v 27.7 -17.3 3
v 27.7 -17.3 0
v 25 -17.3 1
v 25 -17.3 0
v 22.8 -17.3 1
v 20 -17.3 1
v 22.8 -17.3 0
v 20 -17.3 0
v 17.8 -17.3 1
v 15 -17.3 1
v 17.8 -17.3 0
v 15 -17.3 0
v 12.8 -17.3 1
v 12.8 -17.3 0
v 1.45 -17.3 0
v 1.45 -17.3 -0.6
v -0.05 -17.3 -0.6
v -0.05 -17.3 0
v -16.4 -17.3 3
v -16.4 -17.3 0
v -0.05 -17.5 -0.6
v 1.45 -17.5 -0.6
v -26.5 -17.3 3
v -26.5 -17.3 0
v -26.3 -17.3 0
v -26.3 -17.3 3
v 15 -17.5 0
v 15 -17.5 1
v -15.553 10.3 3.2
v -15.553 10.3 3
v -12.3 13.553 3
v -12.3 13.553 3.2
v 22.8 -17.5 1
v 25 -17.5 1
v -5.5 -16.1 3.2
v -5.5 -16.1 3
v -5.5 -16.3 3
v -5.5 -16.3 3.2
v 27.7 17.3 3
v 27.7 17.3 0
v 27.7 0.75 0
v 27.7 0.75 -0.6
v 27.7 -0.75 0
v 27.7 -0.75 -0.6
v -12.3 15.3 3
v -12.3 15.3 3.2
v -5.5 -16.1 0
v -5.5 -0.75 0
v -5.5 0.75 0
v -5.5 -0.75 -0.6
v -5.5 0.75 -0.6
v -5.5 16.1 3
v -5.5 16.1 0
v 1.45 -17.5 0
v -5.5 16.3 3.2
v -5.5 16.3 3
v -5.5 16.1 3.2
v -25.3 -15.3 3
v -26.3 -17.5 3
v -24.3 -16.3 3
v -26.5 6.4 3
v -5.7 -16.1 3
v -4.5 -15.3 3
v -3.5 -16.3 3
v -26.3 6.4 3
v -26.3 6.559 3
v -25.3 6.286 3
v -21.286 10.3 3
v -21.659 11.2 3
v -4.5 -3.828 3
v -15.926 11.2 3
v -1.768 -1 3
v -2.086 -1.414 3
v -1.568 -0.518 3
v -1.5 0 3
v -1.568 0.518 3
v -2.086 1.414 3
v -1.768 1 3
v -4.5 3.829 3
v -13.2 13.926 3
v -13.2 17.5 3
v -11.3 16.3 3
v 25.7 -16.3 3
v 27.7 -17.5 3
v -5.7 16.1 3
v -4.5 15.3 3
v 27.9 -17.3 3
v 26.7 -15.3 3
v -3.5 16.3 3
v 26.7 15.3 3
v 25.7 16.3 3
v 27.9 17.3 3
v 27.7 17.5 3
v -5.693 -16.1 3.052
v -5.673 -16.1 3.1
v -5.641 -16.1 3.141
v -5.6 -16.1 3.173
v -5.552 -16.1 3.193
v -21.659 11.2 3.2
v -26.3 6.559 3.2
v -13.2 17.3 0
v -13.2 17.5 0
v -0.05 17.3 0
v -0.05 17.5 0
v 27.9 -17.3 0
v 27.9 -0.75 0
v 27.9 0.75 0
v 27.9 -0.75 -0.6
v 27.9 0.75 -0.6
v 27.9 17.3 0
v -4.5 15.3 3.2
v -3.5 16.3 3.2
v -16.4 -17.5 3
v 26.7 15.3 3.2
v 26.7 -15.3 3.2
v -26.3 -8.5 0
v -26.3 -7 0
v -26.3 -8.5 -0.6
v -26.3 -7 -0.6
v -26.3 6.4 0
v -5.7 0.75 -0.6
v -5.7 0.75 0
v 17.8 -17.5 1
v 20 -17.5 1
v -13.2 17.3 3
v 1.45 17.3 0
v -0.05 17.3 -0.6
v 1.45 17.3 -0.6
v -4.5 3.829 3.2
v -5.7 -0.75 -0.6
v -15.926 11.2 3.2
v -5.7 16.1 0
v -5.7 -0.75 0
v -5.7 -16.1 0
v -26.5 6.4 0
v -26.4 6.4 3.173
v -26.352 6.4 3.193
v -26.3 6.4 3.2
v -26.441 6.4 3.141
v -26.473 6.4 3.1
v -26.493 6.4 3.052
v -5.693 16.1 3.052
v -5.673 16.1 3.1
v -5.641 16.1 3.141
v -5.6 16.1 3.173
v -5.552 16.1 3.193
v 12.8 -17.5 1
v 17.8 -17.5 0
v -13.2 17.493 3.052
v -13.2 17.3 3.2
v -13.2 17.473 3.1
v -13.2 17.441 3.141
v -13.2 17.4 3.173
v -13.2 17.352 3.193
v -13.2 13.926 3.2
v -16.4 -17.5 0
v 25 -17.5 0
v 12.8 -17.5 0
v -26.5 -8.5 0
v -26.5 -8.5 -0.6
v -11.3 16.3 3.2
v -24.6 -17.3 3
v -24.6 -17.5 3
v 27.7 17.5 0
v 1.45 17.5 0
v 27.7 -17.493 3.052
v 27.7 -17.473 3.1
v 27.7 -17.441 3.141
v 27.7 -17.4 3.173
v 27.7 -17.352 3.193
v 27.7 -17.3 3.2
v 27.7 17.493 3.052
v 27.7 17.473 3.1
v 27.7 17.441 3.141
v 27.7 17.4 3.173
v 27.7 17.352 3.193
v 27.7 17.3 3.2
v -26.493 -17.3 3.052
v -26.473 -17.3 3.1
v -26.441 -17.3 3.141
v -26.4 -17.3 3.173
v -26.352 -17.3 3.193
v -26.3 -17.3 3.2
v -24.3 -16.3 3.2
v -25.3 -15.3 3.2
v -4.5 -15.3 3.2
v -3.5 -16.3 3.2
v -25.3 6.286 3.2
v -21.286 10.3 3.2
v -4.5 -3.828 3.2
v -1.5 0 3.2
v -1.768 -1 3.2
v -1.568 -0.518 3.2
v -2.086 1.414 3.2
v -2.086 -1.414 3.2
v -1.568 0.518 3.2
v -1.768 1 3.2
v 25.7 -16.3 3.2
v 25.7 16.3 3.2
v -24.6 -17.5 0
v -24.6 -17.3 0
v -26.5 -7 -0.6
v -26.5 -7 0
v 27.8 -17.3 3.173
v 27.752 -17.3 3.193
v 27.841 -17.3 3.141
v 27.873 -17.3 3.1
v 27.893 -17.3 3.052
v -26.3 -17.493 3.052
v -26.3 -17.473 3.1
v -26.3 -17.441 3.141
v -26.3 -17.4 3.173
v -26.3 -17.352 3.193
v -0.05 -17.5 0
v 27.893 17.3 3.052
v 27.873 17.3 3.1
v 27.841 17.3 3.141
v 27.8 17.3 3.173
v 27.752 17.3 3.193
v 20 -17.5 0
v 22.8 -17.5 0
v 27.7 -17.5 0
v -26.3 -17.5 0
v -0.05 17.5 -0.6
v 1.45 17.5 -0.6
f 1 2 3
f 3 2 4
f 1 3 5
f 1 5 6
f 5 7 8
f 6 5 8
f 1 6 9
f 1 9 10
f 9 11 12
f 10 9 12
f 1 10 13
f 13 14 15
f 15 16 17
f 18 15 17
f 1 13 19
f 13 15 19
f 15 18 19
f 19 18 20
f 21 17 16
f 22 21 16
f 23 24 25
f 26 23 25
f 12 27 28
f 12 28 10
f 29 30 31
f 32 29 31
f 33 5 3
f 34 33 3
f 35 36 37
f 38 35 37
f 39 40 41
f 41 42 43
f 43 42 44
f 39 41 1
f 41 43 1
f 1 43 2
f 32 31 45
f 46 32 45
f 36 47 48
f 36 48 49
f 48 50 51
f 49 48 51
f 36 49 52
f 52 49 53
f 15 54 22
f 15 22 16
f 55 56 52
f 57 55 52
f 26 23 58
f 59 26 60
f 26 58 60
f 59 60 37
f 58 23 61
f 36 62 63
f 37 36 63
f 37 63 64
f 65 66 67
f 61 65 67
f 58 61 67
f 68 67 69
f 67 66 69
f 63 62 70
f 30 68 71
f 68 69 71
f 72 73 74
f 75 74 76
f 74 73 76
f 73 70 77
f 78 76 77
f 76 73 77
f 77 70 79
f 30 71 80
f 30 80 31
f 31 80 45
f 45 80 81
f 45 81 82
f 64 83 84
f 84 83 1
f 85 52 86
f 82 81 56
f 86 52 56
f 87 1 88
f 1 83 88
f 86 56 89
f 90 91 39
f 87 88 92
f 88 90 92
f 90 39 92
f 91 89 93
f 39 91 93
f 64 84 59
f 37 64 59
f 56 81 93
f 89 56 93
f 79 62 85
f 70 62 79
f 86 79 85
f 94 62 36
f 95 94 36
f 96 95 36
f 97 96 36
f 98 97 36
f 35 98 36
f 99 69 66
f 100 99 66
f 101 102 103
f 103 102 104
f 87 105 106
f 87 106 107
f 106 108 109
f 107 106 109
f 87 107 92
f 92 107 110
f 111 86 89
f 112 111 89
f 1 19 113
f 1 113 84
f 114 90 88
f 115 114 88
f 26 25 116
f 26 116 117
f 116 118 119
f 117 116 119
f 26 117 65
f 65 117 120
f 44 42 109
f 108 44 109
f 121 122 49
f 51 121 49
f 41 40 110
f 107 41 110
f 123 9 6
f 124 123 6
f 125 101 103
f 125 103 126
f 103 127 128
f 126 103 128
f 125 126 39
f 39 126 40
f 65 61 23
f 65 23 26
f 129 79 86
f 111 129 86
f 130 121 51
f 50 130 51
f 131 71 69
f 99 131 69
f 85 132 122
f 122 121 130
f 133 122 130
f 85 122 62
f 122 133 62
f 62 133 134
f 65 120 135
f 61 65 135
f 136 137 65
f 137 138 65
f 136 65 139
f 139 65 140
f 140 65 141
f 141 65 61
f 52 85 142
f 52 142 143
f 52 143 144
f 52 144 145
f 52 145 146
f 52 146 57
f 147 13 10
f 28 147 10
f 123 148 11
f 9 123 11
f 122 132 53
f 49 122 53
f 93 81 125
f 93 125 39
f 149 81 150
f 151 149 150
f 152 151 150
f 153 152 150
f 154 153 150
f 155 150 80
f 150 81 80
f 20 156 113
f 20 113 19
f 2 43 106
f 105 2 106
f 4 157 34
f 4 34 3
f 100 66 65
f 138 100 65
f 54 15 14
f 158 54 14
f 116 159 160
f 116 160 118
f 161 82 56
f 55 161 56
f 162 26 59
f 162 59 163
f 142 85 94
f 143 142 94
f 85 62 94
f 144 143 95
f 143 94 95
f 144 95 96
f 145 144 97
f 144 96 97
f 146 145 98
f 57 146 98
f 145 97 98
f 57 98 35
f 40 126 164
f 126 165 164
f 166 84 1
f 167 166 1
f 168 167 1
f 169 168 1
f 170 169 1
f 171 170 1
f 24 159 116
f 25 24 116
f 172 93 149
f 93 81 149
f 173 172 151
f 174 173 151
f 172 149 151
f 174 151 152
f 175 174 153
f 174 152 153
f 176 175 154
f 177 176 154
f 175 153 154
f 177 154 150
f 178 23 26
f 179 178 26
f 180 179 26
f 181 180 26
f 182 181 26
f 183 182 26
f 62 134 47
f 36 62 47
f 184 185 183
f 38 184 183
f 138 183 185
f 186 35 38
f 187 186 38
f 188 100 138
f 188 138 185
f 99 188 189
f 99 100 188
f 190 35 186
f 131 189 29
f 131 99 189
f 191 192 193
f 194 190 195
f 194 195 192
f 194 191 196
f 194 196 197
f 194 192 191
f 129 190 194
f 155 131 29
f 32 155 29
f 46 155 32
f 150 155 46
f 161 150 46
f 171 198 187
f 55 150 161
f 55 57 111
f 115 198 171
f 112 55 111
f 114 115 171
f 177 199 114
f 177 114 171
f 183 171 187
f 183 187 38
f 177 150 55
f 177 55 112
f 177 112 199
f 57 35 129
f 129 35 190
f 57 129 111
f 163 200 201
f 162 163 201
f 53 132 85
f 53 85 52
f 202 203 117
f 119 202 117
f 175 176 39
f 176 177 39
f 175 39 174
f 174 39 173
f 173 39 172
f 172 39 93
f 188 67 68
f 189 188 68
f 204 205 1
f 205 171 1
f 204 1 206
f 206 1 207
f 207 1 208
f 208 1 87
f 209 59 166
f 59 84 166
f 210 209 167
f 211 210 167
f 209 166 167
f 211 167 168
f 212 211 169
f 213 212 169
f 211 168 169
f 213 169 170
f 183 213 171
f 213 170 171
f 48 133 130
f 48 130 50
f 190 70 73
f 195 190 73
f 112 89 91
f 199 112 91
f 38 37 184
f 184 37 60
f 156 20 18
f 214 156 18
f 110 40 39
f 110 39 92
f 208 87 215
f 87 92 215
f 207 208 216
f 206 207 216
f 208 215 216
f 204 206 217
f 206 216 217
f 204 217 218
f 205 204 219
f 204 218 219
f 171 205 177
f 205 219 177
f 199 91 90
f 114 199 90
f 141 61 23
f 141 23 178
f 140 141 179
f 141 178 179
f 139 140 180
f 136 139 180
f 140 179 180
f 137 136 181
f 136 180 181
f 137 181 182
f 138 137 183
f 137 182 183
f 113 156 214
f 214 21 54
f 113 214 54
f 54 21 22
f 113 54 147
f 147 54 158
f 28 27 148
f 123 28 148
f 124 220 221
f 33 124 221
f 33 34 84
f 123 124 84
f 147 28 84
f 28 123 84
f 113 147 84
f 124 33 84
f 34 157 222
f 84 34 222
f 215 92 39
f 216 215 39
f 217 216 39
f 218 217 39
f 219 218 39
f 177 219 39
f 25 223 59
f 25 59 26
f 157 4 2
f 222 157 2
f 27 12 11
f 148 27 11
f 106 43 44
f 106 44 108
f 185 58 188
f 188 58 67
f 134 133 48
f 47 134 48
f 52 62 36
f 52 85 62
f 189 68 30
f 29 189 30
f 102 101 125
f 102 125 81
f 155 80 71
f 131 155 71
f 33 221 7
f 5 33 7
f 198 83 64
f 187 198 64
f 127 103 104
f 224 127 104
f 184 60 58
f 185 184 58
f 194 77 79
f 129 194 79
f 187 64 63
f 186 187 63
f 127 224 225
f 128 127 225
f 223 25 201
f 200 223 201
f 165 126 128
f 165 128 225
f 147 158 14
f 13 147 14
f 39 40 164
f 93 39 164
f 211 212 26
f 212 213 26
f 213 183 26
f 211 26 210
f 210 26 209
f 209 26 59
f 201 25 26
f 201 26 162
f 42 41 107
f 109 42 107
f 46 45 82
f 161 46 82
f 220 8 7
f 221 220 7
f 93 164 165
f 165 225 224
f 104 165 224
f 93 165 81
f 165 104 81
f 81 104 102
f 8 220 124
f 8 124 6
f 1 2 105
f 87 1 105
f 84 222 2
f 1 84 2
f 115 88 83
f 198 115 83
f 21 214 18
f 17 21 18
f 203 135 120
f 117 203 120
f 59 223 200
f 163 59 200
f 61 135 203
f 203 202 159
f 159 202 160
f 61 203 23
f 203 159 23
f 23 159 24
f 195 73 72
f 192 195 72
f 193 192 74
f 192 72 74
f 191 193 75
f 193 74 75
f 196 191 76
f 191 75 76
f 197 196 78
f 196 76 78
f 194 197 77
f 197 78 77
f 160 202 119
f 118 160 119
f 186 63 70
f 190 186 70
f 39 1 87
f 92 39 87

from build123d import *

# Parameters (mm, degrees)
F0_W     = 0.2
F0_H     = 1.5
F0_H_2   = 8.8
F1_DEPTH = 3
F0_W_2   = 1.7
F0_H_3   = 0.2
F0_W_3   = 16.35
F0_W_4   = 1.5
F0_W_5   = 11.35
F0_W_6   = 2.199999
F0_W_7   = 2.800001
F0_W_8   = 2.700001
F0_H_4   = 15.349983
F0_H_5   = 15.349984
F0_H_6   = 16.549983
F0_H_7   = 16.549984
F0_W_9   = 26.25
F0_W_10  = 13.149958
F2_START = 3
F2_DEPTH = 0.2
F3_DEPTH = 1
F4_DEPTH = 0.6
F5_R     = 0.1999


# Not quite as in the source:
# - a fillet or chamfer is up to 0.001 mm smaller than in the source, because OpenCascade refuses the exact size
# - ends of sketch curves that miss each other by under 0.0002 mm in the source are joined


with BuildPart() as f1:
    # F0 (on Top) → F1 (new body)
    with BuildSketch(Plane.XY):
        with Locations((-26.40002, -7.749967)):
            Rectangle(F0_W, F0_H)
        Polygon((-26.30002, 6.400033), (-26.50002, 6.400037), (-26.50002, -6.999967), (-26.30002, -6.999967), align=None)
        with Locations((-26.40002, -12.899967)):
            Rectangle(F0_W, F0_H_2)
    extrude(amount=F1_DEPTH)

    # F0 (on Top) → F4, piece 3 (join)
    with BuildSketch(Plane.XY):
        with Locations((-26.40002, -7.749967)):
            Rectangle(F0_W, F0_H)
    extrude(amount=-F4_DEPTH)


with BuildPart() as f1b:
    # F0 (on Top) → F1, piece 2 (new body)
    with BuildSketch(Plane.XY):
        with Locations((-25.45002, -17.399967)):
            Rectangle(F0_W_2, F0_H_3)
    extrude(amount=F1_DEPTH)


with BuildPart() as f1c:
    # F0 (on Top) → F1, piece 3 (new body)
    with BuildSketch(Plane.XY):
        with Locations((-8.22502, -17.399967)):
            Rectangle(F0_W_3, F0_H_3)
        with Locations((0.69998, -17.399967)):
            Rectangle(F0_W_4, F0_H_3)
        with Locations((7.12498, -17.399967)):
            Rectangle(F0_W_5, F0_H_3)
        with Locations((13.8999795, -17.399967)):
            Rectangle(F0_W_6, F0_H_3)
        with Locations((16.3999795, -17.399967)):
            Rectangle(F0_W_7, F0_H_3)
        with Locations((18.8999795, -17.399967)):
            Rectangle(F0_W_6, F0_H_3)
        with Locations((21.3999795, -17.399967)):
            Rectangle(F0_W_7, F0_H_3)
        with Locations((23.8999795, -17.399967)):
            Rectangle(F0_W_6, F0_H_3)
        with Locations((26.3499795, -17.399967)):
            Rectangle(F0_W_8, F0_H_3)
    extrude(amount=F1_DEPTH)

    # F0 (on Top) → F3 (cut)
    with BuildSketch(Plane.XY):
        with Locations((13.8999795, -17.399967)):
            Rectangle(F0_W_6, F0_H_3)
        with Locations((18.8999795, -17.399967)):
            Rectangle(F0_W_6, F0_H_3)
        with Locations((23.8999795, -17.399967)):
            Rectangle(F0_W_6, F0_H_3)
    extrude(amount=F3_DEPTH, mode=Mode.SUBTRACT)

    # F0 (on Top) → F4 (join)
    with BuildSketch(Plane.XY):
        with Locations((0.69998, -17.399967)):
            Rectangle(F0_W_4, F0_H_3)
    extrude(amount=-F4_DEPTH)


with BuildPart() as f1d:
    # F0 (on Top) → F1, piece 4 (new body)
    with BuildSketch(Plane.XY):
        with Locations((-5.60002, -8.4249755)):
            Rectangle(F0_W, F0_H_4)
        with Locations((-5.60002, 1.6e-05)):
            Rectangle(F0_W, F0_H)
        with Locations((-5.60002, 8.425008)):
            Rectangle(F0_W, F0_H_5)
    extrude(amount=F1_DEPTH)

    # F0 (on Top) → F4, piece 2 (join)
    with BuildSketch(Plane.XY):
        with Locations((-5.60002, 1.6e-05)):
            Rectangle(F0_W, F0_H)
    extrude(amount=-F4_DEPTH)


with BuildPart() as f1e:
    # F0 (on Top) → F1, piece 5 (new body)
    with BuildSketch(Plane.XY):
        with Locations((27.79998, -9.0249755)):
            Rectangle(F0_W, F0_H_6)
        with Locations((27.79998, 1.6e-05)):
            Rectangle(F0_W, F0_H)
        with Locations((27.79998, 9.025008)):
            Rectangle(F0_W, F0_H_7)
    extrude(amount=F1_DEPTH)

    # F0 (on Top) → F4, piece 5 (join)
    with BuildSketch(Plane.XY):
        with Locations((27.79998, 1.6e-05)):
            Rectangle(F0_W, F0_H)
    extrude(amount=-F4_DEPTH)


with BuildPart() as f1f:
    # F0 (on Top) → F1, piece 6 (new body)
    with BuildSketch(Plane.XY):
        with Locations((14.57498, 17.4)):
            Rectangle(F0_W_9, F0_H_3)
        with Locations((0.69998, 17.4)):
            Rectangle(F0_W_4, F0_H_3)
        with Locations((-6.624999, 17.4)):
            Rectangle(F0_W_10, F0_H_3)
    extrude(amount=F1_DEPTH)

    # F0 (on Top) → F4, piece 4 (join)
    with BuildSketch(Plane.XY):
        with Locations((0.69998, 17.4)):
            Rectangle(F0_W_4, F0_H_3)
    extrude(amount=-F4_DEPTH)


with BuildPart() as f2:
    # F0 (on Top) → F2 (new body)
    with BuildSketch(Plane.XY.offset(F2_START)):
        Polygon((-26.30002, 6.500037), (-26.30002, 6.400033), (-26.30002, -6.999967), (-26.30002, -8.499967), (-26.30002, -17.299967), (-24.60002, -17.299967), (-24.60002, -17.499967), (-16.40002, -17.499967), (-16.40002, -17.299967), (-0.05002, -17.299967), (1.44998, -17.299967), (12.79998, -17.299967), (14.999979, -17.299967), (17.79998, -17.299967), (19.999979, -17.299967), (22.79998, -17.299967), (24.999979, -17.299967), (27.69998, -17.299967), (27.69998, -0.749984), (27.69998, 0.750016), (27.69998, 17.3), (1.44998, 17.3), (-0.05002, 17.3), (-13.199978, 17.3), (-13.199978, 13.925762), (-15.925703, 11.200037), (-21.658599, 11.200037), (-26.30002, 6.558616), align=None)
        Polygon((-25.30002, -15.299967), (-25.30002, 6.28582), (-21.285807, 10.300037), (-15.55291, 10.300037), (-12.299978, 13.55297), (-12.299978, 15.3), (-11.299978, 16.3), (-5.50002, 16.3), (-5.50002, 16.1), (-5.50002, 0.750016), (-5.50002, -0.749984), (-5.50002, -16.099967), (-5.50002, -16.299967), (-24.30002, -16.299967), align=None, mode=Mode.SUBTRACT)
        with BuildLine():
            Line((25.69998, 16.3), (26.69998, 15.3))
            Line((26.69998, 15.3), (26.69998, -15.299967))
            Line((26.69998, -15.299967), (25.69998, -16.299967))
            Line((25.69998, -16.299967), (-3.50002, -16.299967))
            Line((-3.50002, -16.299967), (-4.50002, -15.299967))
            Line((-4.50002, -15.299967), (-4.50002, -3.828411))
            Line((-4.50002, -3.828411), (-2.085807, -1.414197))
            ThreePointArc((-2.085807, -1.414197), (-1.50002, 1.63536e-05), (-2.0858069376, 1.4142300624))
            Line((-2.0858069376, 1.4142300624), (-4.500051, 3.828581))
            Line((-4.500051, 3.828581), (-4.50002, 15.3))
            Line((-4.50002, 15.3), (-3.50002, 16.3))
            Line((-3.50002, 16.3), (25.69998, 16.3))
        make_face(mode=Mode.SUBTRACT)
        with Locations((-25.45002, -17.399967)):
            Rectangle(F0_W_2, F0_H_3)
        with Locations((-26.40002, -12.899967)):
            Rectangle(F0_W, F0_H_2)
        with Locations((-26.40002, -7.749967)):
            Rectangle(F0_W, F0_H)
        Polygon((-26.30002, 6.400033), (-26.50002, 6.400037), (-26.50002, -6.999967), (-26.30002, -6.999967), align=None)
        with Locations((-6.624999, 17.4)):
            Rectangle(F0_W_10, F0_H_3)
        with Locations((-5.60002, 8.425008)):
            Rectangle(F0_W, F0_H_5)
        with Locations((-5.60002, 1.6e-05)):
            Rectangle(F0_W, F0_H)
        with Locations((-5.60002, -8.4249755)):
            Rectangle(F0_W, F0_H_4)
        with Locations((-8.22502, -17.399967)):
            Rectangle(F0_W_3, F0_H_3)
        with Locations((0.69998, -17.399967)):
            Rectangle(F0_W_4, F0_H_3)
        with Locations((7.12498, -17.399967)):
            Rectangle(F0_W_5, F0_H_3)
        with Locations((13.8999795, -17.399967)):
            Rectangle(F0_W_6, F0_H_3)
        with Locations((16.3999795, -17.399967)):
            Rectangle(F0_W_7, F0_H_3)
        with Locations((18.8999795, -17.399967)):
            Rectangle(F0_W_6, F0_H_3)
        with Locations((21.3999795, -17.399967)):
            Rectangle(F0_W_7, F0_H_3)
        with Locations((23.8999795, -17.399967)):
            Rectangle(F0_W_6, F0_H_3)
        with Locations((26.3499795, -17.399967)):
            Rectangle(F0_W_8, F0_H_3)
        with Locations((27.79998, -9.0249755)):
            Rectangle(F0_W, F0_H_6)
        with Locations((27.79998, 1.6e-05)):
            Rectangle(F0_W, F0_H)
        with Locations((27.79998, 9.025008)):
            Rectangle(F0_W, F0_H_7)
        with Locations((14.57498, 17.4)):
            Rectangle(F0_W_9, F0_H_3)
        with Locations((0.69998, 17.4)):
            Rectangle(F0_W_4, F0_H_3)
    extrude(amount=F2_DEPTH)

    # F5 (radius 0.2 in the source; OpenCascade refuses exactly that, so slightly less here)
    f5_edges = [f2.edges().sort_by_distance(p)[0] for p in [
        (0.69998, -17.499967, 3.2),
        (27.89998, 1.7e-05, 3.2),
        (7.250001, 17.5, 3.2),
        (-26.50002, -5.449965, 3.2),
        (-5.70002, 1.7e-05, 3.2),
    ]]
    fillet(f5_edges, radius=F5_R)


solid = Compound([f1.part, f1b.part, f1c.part, f1d.part, f1e.part, f1f.part, f2.part])
